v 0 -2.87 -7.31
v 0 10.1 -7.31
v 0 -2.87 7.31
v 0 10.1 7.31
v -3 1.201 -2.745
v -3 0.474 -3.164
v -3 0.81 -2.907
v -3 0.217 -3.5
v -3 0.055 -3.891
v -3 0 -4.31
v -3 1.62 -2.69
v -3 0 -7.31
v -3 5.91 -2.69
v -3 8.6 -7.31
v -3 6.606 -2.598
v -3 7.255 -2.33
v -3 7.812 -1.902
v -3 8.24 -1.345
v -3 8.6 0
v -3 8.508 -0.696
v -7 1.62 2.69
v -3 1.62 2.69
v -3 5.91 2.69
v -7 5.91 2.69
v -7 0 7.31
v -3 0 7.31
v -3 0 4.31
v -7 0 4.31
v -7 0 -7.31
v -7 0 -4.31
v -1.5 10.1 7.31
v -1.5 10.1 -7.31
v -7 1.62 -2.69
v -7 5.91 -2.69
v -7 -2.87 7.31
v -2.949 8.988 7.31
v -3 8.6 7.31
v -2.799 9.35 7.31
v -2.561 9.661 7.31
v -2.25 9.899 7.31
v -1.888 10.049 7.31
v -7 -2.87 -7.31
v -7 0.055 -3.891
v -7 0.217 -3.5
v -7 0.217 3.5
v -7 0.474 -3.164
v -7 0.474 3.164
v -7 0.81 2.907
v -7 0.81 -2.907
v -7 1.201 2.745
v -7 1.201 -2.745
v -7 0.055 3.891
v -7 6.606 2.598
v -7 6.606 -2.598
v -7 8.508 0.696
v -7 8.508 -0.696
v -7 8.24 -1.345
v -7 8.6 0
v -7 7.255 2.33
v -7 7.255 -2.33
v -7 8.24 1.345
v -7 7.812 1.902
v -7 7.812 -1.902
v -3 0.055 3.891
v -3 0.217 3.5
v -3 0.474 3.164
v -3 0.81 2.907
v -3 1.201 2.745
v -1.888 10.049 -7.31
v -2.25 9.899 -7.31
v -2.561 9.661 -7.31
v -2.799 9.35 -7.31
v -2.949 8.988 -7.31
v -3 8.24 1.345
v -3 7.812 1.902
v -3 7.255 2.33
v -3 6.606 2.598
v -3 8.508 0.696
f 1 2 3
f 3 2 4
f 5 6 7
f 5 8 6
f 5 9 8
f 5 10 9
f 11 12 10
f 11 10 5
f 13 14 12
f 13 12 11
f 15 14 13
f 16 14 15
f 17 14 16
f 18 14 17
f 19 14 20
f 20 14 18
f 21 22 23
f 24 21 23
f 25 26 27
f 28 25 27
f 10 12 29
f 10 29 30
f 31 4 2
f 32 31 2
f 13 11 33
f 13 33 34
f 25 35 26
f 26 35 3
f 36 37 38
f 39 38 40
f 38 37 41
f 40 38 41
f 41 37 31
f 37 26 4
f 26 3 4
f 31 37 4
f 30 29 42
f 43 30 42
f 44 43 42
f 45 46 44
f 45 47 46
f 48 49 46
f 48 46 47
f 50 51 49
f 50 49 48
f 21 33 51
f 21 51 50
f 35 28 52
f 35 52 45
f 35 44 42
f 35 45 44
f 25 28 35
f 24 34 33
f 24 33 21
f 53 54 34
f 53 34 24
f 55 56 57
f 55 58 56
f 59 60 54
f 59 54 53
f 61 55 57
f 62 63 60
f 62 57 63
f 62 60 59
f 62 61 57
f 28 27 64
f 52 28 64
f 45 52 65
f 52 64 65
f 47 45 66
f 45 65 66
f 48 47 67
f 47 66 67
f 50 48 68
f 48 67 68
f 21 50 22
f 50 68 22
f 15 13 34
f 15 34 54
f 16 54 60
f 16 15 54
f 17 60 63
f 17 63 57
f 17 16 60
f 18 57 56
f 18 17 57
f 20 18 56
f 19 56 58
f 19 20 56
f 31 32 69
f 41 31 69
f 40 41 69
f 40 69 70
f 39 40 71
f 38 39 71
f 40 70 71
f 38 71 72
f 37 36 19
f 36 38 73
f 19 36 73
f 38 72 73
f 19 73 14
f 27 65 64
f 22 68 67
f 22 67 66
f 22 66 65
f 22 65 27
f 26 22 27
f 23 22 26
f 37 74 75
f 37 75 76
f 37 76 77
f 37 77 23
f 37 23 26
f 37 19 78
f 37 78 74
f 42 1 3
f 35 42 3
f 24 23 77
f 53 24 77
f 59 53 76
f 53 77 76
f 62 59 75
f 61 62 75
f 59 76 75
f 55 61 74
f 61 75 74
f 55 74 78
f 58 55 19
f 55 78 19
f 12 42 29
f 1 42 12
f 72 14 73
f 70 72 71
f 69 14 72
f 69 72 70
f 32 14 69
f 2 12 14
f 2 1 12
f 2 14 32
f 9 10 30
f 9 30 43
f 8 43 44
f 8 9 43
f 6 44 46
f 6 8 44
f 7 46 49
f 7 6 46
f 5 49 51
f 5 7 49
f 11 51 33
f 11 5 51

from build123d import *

# Parameters (mm, degrees)
BOSS_EXTRUDE1_DEPTH = 7
BOSS_EXTRUDE2_DEPTH = 3
CUT_EXTRUDE1_DEPTH  = 14.62


with BuildPart() as part:
    # Sketch1 → Boss-Extrude1 (new body)
    with BuildSketch(Plane(origin=(0, 0, 0), x_dir=(0, 0, -1), z_dir=(1, 0, 0))):
        with BuildLine():
            ThreePointArc((2.69, 5.91), (1.902117241, 7.812117241), (0, 8.6))
            Line((0, 8.6), (0, 0))
            Line((0, 0), (0, -2.87))
            Line((0, -2.87), (7.31, -2.87))
            Line((7.31, -2.87), (7.31, 0))
            Line((7.31, 0), (4.31, 0))
            ThreePointArc((4.31, 0), (3.164487014, 0.474487014), (2.69, 1.62))
            Line((2.69, 1.62), (2.69, 5.91))
        make_face()
    boss_extrude1 = extrude(amount=-BOSS_EXTRUDE1_DEPTH)

    # Sketch1<3> → Boss-Extrude2 (add)
    with BuildSketch(Plane(origin=(0, 0, 0), x_dir=(0, 0, -1), z_dir=(1, 0, 0))):
        with BuildLine():
            Line((7.31, 10.1), (0, 10.1))
            Line((0, 10.1), (0, 8.6))
            ThreePointArc((0, 8.6), (1.902117241, 7.812117241), (2.69, 5.91))
            Line((2.69, 5.91), (2.69, 1.62))
            ThreePointArc((2.69, 1.62), (3.164487014, 0.474487014), (4.31, 0))
            Line((4.31, 0), (7.31, 0))
            Line((7.31, 0), (7.31, 10.1))
        make_face()
    boss_extrude2 = extrude(amount=-BOSS_EXTRUDE2_DEPTH)

    # Mirror1: Boss-Extrude1, Boss-Extrude2 across plane
    add(boss_extrude1.mirror(Plane.XY))
    add(boss_extrude2.mirror(Plane.XY))

    # Sketch2 → Cut-Extrude1 (cut)
    with BuildSketch(Plane(origin=(0, 0, -7.31), x_dir=(-1, 0, 0), z_dir=(0, 0, -1))):
        with BuildLine():
            Line((3, 10.1), (1.5, 10.1))
            ThreePointArc((1.5, 10.1), (2.560660172, 9.660660172), (3, 8.6))
            Line((3, 8.6), (3, 10.1))
        make_face()
    extrude(amount=-CUT_EXTRUDE1_DEPTH, mode=Mode.SUBTRACT)


solid = part.part
